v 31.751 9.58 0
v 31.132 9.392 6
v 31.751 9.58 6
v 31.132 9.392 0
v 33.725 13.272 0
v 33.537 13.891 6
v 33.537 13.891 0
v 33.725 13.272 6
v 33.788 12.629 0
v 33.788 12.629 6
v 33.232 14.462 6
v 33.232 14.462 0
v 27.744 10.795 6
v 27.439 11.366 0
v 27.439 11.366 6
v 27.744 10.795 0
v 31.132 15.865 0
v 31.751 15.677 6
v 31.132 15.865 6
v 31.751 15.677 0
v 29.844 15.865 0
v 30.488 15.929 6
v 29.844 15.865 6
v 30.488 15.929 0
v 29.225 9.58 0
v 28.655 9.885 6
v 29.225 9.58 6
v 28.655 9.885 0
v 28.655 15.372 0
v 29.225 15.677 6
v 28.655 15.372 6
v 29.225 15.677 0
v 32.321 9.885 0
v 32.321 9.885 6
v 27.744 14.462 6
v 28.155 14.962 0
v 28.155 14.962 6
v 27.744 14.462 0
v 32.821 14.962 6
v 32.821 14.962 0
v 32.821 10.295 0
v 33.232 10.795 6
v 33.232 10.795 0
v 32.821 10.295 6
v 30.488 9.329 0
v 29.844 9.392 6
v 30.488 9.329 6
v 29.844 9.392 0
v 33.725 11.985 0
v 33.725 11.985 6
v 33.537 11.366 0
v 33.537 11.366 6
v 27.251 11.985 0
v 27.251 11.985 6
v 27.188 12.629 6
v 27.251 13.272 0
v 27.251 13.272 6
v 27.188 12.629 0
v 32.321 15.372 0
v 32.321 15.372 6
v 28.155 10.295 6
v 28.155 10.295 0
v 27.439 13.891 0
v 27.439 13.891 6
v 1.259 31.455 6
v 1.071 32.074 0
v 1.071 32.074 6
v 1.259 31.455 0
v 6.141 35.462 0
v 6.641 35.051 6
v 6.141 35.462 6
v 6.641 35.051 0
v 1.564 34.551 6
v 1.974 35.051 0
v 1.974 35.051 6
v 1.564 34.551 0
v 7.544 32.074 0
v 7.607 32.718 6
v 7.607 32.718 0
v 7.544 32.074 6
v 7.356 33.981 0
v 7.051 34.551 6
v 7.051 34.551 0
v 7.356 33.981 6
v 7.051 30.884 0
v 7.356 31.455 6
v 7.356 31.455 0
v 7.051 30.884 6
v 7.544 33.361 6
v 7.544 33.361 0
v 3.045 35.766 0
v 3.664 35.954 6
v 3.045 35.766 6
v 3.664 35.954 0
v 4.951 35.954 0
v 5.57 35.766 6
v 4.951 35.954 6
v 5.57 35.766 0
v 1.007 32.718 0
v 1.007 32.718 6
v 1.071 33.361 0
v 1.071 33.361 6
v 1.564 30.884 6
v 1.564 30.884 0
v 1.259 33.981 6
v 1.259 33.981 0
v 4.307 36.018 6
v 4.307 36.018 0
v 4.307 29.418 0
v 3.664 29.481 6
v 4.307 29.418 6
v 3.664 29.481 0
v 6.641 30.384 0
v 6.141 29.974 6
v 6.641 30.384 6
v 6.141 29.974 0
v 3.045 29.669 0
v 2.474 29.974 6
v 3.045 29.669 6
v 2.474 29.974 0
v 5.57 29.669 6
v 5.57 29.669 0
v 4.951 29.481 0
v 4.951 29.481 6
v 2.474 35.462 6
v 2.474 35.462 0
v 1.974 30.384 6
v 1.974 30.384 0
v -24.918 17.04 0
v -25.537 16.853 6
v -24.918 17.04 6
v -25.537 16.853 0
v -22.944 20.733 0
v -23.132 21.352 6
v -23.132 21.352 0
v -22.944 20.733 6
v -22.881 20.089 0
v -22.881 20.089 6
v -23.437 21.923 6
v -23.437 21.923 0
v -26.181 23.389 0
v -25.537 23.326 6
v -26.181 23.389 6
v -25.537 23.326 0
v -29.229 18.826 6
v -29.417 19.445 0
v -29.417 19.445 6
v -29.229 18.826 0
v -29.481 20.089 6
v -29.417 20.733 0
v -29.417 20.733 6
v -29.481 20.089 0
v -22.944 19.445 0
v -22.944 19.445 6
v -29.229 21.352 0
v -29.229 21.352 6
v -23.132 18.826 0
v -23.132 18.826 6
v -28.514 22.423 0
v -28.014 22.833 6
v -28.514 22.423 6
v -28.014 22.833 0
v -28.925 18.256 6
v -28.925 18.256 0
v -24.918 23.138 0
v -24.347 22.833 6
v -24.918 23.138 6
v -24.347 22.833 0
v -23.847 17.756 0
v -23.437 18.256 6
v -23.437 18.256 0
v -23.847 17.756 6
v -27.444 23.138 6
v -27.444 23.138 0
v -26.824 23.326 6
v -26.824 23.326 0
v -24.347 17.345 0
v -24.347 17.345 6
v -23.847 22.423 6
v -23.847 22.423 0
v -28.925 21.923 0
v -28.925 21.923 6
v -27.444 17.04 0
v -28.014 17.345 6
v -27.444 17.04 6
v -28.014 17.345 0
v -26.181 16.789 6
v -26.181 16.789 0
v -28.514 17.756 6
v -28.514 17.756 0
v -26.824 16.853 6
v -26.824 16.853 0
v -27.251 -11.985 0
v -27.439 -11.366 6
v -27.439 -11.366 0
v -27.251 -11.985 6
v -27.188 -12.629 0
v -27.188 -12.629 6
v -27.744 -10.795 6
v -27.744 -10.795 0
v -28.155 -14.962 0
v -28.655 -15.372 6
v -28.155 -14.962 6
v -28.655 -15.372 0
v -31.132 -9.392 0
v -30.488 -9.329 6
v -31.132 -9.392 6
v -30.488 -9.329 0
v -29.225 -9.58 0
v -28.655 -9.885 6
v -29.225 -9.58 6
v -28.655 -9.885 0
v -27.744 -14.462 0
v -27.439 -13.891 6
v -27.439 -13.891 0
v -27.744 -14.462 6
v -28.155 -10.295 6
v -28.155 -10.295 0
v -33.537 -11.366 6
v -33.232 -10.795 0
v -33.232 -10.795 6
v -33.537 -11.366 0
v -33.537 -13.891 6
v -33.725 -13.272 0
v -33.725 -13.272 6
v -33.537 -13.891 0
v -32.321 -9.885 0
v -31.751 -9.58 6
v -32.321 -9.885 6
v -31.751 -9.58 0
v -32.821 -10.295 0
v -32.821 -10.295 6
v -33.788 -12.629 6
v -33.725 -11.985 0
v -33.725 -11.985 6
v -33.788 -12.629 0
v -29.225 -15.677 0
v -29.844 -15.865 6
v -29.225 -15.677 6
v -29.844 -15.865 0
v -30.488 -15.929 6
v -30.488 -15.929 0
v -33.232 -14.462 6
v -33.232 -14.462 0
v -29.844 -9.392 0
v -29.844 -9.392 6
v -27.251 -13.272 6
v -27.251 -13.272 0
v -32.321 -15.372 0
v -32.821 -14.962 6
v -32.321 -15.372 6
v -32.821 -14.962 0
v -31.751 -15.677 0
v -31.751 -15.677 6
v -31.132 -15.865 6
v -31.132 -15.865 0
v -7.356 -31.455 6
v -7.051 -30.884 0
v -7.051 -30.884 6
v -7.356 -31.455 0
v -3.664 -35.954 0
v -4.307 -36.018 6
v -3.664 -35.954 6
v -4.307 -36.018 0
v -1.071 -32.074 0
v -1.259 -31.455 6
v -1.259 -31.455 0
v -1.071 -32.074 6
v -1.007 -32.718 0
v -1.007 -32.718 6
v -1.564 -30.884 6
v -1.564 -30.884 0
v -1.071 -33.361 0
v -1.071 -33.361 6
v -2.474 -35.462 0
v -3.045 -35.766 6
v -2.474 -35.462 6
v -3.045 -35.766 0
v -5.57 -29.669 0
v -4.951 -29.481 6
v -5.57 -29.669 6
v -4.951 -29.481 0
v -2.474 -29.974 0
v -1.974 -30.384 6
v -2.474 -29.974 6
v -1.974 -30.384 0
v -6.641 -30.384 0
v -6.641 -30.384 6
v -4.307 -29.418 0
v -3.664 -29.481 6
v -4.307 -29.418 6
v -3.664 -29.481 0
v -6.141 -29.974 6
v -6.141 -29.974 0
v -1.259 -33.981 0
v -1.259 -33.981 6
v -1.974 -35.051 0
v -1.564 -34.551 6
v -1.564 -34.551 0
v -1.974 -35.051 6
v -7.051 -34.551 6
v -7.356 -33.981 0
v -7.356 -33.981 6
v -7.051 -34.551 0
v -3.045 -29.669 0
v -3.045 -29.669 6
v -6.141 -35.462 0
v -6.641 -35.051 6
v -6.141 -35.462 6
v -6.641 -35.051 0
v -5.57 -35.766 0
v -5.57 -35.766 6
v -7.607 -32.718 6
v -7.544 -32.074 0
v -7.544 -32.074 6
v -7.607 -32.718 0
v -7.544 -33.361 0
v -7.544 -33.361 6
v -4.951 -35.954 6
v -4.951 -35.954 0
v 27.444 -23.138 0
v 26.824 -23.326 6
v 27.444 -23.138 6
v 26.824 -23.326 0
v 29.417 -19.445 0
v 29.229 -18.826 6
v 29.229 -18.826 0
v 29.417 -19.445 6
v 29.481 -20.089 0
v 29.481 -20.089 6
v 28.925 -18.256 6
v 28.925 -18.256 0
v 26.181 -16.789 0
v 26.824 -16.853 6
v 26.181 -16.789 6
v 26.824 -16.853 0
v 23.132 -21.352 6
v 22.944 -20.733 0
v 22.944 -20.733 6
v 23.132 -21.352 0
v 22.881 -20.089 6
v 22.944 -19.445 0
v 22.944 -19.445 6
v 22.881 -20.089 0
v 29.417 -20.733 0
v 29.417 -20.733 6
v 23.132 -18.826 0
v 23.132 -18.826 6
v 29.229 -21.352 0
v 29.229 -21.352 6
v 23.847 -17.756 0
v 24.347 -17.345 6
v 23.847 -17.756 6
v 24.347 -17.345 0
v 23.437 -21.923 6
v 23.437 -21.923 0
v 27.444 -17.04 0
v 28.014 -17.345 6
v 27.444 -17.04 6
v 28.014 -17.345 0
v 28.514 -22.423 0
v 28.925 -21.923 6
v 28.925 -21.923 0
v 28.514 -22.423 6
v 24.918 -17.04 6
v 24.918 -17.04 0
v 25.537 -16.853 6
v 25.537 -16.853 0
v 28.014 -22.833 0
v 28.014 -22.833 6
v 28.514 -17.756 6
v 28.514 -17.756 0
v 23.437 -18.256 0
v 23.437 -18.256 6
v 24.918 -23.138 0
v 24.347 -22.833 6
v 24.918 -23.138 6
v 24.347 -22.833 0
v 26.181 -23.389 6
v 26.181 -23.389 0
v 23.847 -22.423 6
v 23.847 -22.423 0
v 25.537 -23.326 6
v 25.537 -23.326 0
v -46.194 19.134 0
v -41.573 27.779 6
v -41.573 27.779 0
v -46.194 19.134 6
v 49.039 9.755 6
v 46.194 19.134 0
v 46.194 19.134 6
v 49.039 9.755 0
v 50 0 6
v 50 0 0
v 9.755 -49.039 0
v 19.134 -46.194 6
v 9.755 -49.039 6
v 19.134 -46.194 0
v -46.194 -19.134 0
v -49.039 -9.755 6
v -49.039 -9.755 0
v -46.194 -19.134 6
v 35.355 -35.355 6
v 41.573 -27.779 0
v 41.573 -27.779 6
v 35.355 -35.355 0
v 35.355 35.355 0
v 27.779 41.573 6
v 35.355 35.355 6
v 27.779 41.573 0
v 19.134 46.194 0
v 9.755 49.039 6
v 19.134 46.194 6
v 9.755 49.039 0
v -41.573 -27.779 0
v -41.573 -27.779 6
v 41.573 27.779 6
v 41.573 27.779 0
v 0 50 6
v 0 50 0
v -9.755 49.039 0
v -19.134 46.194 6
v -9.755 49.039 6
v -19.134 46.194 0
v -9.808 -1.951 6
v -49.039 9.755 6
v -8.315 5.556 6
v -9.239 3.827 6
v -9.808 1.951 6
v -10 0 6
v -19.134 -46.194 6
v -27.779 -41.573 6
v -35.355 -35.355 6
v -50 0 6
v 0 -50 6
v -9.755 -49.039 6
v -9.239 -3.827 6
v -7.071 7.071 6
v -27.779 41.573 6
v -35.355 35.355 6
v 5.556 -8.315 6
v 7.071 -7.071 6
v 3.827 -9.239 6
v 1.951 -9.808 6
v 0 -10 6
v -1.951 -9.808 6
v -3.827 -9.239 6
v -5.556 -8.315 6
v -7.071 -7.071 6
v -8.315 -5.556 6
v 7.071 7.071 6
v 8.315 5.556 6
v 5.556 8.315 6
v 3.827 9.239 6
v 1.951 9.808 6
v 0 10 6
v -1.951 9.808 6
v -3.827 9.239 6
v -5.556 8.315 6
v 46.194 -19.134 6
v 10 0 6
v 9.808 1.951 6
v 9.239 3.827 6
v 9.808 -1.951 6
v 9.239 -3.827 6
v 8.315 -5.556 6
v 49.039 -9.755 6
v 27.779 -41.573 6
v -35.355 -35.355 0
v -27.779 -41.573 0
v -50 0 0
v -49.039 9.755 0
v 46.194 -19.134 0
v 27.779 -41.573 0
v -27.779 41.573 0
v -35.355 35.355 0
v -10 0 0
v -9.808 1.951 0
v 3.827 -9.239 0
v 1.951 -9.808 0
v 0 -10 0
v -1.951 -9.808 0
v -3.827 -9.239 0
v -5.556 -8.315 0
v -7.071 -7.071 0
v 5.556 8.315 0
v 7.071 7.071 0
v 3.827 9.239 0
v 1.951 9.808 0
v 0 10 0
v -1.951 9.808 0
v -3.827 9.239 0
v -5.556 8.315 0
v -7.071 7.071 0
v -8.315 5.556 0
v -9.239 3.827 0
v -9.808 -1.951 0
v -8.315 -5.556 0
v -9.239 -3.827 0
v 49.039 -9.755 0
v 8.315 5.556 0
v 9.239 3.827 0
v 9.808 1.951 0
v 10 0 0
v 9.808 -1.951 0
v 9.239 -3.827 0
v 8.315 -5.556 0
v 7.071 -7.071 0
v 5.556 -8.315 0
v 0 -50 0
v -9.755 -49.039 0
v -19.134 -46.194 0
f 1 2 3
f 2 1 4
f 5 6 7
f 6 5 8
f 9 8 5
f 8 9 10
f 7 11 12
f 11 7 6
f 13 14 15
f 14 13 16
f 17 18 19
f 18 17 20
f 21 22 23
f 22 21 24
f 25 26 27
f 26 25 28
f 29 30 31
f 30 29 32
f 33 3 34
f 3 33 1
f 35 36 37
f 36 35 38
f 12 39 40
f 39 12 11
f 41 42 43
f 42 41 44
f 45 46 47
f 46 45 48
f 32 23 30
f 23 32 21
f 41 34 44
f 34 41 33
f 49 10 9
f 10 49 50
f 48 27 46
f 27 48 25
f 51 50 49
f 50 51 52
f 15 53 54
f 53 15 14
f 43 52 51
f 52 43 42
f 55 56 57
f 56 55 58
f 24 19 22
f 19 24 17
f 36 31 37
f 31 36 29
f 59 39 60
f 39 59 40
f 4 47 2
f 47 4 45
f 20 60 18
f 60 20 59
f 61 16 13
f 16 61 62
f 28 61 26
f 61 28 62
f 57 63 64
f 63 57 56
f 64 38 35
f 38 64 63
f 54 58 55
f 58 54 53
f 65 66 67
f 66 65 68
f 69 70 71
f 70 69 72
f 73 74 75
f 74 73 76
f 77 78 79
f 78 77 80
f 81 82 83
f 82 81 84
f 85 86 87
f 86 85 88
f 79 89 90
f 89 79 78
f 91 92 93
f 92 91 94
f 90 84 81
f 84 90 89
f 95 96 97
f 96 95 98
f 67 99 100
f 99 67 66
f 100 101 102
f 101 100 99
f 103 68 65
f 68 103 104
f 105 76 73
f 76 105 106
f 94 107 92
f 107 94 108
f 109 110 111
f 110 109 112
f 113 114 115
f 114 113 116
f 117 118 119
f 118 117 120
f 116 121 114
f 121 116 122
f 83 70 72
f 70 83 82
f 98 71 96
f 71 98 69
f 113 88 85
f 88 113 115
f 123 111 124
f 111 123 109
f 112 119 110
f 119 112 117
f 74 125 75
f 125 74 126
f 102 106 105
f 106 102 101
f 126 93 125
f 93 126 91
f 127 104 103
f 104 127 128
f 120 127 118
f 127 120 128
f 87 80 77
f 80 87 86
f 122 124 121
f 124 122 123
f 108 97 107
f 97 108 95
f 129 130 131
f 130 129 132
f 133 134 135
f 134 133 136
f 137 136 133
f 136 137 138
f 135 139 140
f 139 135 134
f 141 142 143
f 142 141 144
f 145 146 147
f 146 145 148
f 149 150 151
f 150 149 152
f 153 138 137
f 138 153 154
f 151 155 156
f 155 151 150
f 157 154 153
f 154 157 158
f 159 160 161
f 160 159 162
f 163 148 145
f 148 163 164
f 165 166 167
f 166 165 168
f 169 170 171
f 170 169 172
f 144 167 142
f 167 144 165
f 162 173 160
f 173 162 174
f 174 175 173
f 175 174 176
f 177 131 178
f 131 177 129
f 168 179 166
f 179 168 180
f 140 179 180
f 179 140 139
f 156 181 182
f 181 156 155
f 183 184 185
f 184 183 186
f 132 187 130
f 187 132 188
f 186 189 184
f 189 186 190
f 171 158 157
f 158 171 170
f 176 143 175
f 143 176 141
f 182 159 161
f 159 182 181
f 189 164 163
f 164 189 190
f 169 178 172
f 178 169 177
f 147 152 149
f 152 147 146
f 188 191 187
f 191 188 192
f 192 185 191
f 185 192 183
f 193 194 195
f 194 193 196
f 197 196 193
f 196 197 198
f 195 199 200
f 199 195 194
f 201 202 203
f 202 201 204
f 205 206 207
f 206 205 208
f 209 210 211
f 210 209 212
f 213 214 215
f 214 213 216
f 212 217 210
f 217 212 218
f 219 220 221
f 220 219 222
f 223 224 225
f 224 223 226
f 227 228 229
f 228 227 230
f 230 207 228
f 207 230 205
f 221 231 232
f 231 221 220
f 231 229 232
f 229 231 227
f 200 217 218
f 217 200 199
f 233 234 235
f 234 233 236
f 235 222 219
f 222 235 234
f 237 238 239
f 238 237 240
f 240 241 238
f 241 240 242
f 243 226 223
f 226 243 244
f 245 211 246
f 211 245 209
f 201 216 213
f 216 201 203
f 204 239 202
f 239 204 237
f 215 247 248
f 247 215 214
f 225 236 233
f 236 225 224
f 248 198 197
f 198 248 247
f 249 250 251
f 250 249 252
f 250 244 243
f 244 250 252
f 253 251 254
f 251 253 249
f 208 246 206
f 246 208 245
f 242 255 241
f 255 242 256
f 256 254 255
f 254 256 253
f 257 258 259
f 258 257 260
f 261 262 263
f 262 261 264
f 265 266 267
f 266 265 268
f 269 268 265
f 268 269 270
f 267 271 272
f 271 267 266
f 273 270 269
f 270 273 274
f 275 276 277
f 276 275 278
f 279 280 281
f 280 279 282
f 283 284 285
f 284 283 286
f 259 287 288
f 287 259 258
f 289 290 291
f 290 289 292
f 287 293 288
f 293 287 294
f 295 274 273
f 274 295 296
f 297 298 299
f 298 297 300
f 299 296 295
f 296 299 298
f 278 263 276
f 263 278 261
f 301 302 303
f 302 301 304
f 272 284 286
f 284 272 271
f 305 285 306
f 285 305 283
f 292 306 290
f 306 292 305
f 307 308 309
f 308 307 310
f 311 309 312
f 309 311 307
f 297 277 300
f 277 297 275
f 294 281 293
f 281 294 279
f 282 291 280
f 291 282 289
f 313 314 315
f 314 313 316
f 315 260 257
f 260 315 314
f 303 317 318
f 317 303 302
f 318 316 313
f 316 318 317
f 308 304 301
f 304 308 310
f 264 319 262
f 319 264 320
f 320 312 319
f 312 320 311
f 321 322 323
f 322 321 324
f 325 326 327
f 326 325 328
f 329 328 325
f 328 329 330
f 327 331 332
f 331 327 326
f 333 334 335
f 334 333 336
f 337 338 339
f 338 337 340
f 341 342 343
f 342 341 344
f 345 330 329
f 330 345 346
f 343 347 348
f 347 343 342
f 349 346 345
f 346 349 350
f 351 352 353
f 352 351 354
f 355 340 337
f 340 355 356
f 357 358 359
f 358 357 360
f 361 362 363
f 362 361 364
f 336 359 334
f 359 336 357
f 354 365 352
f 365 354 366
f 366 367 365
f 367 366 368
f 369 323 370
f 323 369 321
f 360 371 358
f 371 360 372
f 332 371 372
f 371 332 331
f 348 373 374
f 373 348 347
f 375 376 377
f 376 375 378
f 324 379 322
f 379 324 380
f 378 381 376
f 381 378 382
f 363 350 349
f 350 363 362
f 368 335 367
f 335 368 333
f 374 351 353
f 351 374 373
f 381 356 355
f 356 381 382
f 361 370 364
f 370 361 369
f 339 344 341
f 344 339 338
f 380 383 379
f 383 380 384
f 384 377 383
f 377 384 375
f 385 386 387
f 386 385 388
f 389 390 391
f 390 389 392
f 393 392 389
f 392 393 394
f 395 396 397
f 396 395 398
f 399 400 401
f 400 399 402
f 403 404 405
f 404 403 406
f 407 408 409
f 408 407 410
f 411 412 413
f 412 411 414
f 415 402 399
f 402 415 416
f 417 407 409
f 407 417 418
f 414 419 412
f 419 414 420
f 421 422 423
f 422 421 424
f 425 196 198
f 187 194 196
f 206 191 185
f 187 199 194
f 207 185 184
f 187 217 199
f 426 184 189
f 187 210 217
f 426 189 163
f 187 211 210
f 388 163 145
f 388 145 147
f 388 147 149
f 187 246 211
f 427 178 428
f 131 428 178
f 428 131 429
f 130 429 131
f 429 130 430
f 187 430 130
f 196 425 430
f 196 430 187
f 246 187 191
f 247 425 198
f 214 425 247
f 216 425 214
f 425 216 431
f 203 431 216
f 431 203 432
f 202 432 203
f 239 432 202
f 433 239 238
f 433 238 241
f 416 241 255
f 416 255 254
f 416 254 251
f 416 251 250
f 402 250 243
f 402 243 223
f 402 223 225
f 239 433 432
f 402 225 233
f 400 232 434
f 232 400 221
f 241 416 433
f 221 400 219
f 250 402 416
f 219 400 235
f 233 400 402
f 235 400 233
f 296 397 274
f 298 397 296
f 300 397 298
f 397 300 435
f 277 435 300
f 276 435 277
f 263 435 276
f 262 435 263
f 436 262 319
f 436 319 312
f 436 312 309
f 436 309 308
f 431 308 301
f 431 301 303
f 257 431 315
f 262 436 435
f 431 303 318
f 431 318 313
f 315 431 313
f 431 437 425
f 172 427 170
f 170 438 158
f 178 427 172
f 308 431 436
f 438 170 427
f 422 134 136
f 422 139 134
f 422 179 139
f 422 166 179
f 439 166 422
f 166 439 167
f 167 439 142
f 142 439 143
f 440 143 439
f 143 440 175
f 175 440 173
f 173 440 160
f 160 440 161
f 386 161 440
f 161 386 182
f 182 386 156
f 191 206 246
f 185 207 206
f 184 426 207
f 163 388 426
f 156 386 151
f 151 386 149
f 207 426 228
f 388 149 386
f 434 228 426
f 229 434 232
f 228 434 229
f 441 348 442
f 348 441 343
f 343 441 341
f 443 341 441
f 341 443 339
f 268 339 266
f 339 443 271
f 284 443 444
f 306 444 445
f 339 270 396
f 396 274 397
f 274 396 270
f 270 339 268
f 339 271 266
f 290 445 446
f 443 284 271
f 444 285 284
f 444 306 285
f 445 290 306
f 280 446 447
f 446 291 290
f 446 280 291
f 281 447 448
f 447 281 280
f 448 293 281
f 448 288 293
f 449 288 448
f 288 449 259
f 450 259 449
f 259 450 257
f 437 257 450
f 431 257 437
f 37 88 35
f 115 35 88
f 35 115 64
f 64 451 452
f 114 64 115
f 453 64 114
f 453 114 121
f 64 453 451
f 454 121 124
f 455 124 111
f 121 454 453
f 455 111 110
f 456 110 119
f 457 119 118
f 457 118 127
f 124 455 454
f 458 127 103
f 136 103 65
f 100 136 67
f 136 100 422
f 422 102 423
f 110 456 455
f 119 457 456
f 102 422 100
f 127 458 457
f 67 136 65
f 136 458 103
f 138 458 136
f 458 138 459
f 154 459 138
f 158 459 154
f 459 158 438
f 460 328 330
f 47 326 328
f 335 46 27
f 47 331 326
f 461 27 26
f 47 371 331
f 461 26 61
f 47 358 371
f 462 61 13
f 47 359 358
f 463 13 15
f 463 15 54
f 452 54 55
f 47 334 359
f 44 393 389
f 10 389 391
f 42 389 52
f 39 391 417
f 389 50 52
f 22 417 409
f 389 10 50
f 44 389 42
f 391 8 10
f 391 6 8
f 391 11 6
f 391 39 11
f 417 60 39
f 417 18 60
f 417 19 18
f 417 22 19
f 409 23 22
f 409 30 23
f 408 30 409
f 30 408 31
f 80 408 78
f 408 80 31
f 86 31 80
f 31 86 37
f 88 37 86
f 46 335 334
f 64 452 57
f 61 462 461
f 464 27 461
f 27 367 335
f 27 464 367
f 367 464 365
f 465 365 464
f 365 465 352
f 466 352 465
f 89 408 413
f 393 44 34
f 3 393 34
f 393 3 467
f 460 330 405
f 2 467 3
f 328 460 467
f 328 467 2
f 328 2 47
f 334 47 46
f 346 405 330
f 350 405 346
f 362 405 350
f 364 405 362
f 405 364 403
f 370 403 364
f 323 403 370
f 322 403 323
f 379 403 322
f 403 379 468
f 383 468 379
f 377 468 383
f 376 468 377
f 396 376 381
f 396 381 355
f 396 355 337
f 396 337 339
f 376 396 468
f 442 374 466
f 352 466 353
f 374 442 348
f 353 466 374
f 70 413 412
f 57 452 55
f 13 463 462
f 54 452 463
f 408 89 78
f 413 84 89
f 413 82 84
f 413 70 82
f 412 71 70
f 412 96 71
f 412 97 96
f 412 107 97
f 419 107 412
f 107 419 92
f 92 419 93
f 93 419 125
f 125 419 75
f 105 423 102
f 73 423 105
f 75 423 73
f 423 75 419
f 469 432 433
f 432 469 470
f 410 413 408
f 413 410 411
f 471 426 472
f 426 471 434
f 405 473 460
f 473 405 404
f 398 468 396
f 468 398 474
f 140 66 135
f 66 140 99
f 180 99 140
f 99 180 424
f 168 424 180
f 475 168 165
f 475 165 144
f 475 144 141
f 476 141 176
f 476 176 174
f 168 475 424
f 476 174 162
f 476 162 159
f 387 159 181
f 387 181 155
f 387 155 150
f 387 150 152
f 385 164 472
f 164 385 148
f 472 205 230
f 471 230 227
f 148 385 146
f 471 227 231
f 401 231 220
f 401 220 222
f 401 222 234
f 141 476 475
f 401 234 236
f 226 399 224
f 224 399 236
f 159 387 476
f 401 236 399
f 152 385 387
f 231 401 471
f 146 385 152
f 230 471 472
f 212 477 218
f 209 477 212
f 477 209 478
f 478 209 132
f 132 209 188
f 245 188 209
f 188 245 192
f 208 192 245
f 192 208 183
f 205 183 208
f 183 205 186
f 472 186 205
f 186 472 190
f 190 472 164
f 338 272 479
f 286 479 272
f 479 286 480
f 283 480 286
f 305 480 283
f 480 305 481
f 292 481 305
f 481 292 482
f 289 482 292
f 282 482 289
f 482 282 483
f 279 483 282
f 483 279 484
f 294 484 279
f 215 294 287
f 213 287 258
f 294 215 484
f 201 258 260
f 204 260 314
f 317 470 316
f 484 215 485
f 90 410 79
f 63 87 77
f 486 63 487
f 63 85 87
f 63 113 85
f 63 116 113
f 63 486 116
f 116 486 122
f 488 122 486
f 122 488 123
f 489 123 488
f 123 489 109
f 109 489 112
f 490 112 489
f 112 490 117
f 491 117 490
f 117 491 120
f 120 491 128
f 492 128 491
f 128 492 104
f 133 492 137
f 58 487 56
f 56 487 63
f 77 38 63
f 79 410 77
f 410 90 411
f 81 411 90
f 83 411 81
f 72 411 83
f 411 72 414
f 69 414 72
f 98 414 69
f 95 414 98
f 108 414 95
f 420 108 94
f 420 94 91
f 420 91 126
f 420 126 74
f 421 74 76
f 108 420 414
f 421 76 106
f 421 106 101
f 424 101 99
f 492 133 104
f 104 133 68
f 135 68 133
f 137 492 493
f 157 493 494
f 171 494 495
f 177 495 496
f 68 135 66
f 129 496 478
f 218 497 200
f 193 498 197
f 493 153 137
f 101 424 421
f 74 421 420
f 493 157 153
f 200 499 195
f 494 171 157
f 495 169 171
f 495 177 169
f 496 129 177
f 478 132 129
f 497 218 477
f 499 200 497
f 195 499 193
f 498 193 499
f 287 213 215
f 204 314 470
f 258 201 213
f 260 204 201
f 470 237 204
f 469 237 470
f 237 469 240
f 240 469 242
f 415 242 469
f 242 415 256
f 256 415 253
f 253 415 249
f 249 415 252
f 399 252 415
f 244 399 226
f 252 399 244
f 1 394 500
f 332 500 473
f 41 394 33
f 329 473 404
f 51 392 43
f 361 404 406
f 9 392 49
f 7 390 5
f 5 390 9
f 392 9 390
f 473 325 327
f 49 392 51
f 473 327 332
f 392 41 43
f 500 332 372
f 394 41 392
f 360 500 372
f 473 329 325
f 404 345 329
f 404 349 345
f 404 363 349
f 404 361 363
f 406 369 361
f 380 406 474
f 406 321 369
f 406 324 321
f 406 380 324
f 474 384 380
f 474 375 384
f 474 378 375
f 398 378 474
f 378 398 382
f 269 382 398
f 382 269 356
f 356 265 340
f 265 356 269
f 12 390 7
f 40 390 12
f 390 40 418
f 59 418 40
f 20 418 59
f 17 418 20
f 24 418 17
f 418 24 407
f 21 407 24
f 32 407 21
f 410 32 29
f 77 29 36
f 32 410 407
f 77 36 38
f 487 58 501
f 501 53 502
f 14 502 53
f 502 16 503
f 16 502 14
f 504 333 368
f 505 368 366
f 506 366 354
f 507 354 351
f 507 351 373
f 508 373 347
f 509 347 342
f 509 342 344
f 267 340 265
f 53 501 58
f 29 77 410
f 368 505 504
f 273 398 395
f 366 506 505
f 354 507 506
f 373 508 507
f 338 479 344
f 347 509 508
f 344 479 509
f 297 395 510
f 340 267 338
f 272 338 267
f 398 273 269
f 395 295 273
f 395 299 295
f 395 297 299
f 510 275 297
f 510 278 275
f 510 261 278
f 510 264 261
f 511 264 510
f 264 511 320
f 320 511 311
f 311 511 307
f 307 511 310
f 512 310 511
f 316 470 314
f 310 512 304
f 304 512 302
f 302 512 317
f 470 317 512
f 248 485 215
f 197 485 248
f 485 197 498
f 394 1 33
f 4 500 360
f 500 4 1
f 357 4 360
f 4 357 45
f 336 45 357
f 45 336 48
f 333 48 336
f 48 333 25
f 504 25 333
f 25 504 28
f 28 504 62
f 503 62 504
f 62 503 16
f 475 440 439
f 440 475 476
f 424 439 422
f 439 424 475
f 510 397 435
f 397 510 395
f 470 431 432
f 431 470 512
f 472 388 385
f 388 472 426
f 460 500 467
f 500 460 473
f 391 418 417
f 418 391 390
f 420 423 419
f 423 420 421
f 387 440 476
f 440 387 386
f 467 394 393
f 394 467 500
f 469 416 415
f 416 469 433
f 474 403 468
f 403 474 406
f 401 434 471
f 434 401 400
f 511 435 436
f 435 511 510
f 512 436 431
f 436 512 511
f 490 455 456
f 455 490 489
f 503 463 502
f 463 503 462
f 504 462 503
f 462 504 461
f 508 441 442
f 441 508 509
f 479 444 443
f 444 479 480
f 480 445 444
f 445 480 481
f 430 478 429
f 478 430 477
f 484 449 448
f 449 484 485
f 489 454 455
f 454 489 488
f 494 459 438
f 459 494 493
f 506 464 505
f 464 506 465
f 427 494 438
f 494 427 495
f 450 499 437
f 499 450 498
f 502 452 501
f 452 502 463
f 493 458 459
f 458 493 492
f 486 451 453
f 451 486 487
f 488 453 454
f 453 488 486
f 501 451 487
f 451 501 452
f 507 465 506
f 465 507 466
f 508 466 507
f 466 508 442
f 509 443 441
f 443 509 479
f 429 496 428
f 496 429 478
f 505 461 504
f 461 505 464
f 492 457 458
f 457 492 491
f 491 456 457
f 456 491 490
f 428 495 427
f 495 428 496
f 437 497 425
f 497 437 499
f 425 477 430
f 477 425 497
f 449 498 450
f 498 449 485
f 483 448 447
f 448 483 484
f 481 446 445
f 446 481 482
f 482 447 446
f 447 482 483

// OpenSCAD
$fn = 32;

// ----------------------------------------------------------------------
// Flange Ø100 x 6
// 6 holes on a Ø66 bolt circle, bolted joints
// ----------------------------------------------------------------------

// --- parameters (mm) ---
flange_d = 100;    // outside diameter of the flange
thickness = 6;     // flange thickness
holes = 6;         // number of bolt holes
pcd = 66;          // bolt circle diameter
start_deg = 22.5;  // angle of the first hole, from +X
hole_d = 6.6;      // bolt hole diameter
bore_d = 20;       // central through bore
hub_d = 28;        // hub outside diameter
hub_h = 0;         // hub height above the flange face (0 = no hub)

// --- derived feature positions (mm) ---
height = thickness + hub_h;  // = 6   overall height of the part
pcd_r = pcd / 2;             // = 33   bolt circle radius
hole_step = 360 / holes;     // = 60   angular pitch
feature_centers = [
  [pcd_r * cos(start_deg + 0 * hole_step), pcd_r * sin(start_deg + 0 * hole_step)],
  [pcd_r * cos(start_deg + 1 * hole_step), pcd_r * sin(start_deg + 1 * hole_step)],
  [pcd_r * cos(start_deg + 2 * hole_step), pcd_r * sin(start_deg + 2 * hole_step)],
  [pcd_r * cos(start_deg + 3 * hole_step), pcd_r * sin(start_deg + 3 * hole_step)],
  [pcd_r * cos(start_deg + 4 * hole_step), pcd_r * sin(start_deg + 4 * hole_step)],
  [pcd_r * cos(start_deg + 5 * hole_step), pcd_r * sin(start_deg + 5 * hole_step)]
];   // bolt hole centres on the pitch circle

// flange disc, every hole and the bore cut straight through
difference() {
  union() {
    cylinder(d = flange_d, h = thickness);
  }
  translate([0, 0, -1]) cylinder(d = bore_d, h = height + 2);  // bore, through
  for (centre = feature_centers)
    translate([centre[0], centre[1], -1]) cylinder(d = hole_d, h = thickness + 2);
}
